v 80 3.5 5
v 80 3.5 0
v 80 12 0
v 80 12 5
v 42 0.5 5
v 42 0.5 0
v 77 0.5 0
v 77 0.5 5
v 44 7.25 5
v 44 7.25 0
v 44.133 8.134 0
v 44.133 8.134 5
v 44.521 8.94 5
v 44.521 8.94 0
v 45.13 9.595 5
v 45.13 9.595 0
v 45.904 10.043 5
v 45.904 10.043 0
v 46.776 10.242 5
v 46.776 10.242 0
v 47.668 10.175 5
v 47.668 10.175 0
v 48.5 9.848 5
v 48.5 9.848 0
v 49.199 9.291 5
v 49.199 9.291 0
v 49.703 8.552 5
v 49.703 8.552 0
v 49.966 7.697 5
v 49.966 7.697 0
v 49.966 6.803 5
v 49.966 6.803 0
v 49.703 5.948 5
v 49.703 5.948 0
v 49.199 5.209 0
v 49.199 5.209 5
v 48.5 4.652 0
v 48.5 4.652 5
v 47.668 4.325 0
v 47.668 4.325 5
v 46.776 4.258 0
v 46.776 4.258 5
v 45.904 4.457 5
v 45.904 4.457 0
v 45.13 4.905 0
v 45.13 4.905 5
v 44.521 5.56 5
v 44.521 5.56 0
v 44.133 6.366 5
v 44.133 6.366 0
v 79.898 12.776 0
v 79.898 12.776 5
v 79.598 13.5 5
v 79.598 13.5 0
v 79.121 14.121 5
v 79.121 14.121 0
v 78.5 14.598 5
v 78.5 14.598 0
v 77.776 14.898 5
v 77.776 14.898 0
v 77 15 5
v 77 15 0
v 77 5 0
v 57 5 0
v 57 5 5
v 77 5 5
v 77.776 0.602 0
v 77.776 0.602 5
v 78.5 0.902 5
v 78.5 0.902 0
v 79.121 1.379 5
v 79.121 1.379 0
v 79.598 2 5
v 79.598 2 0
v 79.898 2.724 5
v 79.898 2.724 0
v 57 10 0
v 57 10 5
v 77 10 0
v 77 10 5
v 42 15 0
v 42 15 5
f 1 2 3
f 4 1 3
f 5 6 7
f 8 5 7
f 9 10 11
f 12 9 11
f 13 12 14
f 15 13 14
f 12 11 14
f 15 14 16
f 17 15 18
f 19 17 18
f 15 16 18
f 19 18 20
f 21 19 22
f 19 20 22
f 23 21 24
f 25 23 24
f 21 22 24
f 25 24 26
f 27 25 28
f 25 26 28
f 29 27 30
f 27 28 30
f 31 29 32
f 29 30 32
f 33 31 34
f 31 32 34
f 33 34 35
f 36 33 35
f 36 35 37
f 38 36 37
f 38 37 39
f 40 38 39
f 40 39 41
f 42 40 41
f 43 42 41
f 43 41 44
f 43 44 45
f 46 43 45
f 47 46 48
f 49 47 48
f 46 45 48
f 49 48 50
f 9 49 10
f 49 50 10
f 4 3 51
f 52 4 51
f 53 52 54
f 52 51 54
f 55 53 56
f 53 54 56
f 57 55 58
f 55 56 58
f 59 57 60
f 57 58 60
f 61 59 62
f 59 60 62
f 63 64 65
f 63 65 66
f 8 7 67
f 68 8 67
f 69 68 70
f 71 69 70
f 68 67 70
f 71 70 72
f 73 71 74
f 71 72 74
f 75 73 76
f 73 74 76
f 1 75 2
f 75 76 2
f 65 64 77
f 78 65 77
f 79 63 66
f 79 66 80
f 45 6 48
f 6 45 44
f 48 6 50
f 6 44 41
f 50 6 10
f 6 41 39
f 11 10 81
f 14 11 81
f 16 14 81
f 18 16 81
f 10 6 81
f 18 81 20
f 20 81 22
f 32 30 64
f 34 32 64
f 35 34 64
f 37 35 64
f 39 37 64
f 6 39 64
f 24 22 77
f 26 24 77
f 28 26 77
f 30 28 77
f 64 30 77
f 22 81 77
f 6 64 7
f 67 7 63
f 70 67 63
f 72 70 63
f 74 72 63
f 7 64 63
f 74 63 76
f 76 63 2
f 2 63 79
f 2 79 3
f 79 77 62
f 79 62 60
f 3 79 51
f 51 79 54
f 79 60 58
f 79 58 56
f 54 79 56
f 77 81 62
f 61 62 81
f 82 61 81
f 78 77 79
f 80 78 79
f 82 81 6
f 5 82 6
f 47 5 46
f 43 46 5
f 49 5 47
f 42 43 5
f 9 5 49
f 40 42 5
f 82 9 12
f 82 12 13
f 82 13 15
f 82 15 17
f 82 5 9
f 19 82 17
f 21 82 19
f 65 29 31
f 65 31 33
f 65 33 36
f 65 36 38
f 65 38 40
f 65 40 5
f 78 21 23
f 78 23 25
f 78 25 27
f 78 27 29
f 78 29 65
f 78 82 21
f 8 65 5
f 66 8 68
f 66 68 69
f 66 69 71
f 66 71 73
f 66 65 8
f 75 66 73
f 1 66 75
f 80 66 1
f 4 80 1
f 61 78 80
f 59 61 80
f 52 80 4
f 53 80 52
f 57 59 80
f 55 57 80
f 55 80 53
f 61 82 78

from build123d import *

# Parameters (mm, degrees)
SKETCH1_W           = 20
SKETCH1_H           = 5
BOSS_EXTRUDE1_DEPTH = 5


with BuildPart() as part:
    # Sketch1 → Boss-Extrude1 (new body)
    with BuildSketch(Plane.XY):
        with BuildLine():
            Line((77, 15), (42, 15))
            Line((42, 15), (42, 7.25))
            Line((42, 7.25), (42, 0.5))
            Line((42, 0.5), (77, 0.5))
            ThreePointArc((77, 0.5), (79.121320344, 1.378679656), (80, 3.5))
            Line((80, 3.5), (80, 12))
            ThreePointArc((80, 12), (79.121320344, 14.121320344), (77, 15))
        make_face()
        with BuildLine():
            ThreePointArc((50, 7.25), (47, 4.25), (44, 7.25))
            ThreePointArc((44, 7.25), (47, 10.25), (50, 7.25))
        make_face(mode=Mode.SUBTRACT)
        with Locations((67, 7.5)):
            Rectangle(SKETCH1_W, SKETCH1_H, mode=Mode.SUBTRACT)
    extrude(amount=BOSS_EXTRUDE1_DEPTH)


solid = part.part
